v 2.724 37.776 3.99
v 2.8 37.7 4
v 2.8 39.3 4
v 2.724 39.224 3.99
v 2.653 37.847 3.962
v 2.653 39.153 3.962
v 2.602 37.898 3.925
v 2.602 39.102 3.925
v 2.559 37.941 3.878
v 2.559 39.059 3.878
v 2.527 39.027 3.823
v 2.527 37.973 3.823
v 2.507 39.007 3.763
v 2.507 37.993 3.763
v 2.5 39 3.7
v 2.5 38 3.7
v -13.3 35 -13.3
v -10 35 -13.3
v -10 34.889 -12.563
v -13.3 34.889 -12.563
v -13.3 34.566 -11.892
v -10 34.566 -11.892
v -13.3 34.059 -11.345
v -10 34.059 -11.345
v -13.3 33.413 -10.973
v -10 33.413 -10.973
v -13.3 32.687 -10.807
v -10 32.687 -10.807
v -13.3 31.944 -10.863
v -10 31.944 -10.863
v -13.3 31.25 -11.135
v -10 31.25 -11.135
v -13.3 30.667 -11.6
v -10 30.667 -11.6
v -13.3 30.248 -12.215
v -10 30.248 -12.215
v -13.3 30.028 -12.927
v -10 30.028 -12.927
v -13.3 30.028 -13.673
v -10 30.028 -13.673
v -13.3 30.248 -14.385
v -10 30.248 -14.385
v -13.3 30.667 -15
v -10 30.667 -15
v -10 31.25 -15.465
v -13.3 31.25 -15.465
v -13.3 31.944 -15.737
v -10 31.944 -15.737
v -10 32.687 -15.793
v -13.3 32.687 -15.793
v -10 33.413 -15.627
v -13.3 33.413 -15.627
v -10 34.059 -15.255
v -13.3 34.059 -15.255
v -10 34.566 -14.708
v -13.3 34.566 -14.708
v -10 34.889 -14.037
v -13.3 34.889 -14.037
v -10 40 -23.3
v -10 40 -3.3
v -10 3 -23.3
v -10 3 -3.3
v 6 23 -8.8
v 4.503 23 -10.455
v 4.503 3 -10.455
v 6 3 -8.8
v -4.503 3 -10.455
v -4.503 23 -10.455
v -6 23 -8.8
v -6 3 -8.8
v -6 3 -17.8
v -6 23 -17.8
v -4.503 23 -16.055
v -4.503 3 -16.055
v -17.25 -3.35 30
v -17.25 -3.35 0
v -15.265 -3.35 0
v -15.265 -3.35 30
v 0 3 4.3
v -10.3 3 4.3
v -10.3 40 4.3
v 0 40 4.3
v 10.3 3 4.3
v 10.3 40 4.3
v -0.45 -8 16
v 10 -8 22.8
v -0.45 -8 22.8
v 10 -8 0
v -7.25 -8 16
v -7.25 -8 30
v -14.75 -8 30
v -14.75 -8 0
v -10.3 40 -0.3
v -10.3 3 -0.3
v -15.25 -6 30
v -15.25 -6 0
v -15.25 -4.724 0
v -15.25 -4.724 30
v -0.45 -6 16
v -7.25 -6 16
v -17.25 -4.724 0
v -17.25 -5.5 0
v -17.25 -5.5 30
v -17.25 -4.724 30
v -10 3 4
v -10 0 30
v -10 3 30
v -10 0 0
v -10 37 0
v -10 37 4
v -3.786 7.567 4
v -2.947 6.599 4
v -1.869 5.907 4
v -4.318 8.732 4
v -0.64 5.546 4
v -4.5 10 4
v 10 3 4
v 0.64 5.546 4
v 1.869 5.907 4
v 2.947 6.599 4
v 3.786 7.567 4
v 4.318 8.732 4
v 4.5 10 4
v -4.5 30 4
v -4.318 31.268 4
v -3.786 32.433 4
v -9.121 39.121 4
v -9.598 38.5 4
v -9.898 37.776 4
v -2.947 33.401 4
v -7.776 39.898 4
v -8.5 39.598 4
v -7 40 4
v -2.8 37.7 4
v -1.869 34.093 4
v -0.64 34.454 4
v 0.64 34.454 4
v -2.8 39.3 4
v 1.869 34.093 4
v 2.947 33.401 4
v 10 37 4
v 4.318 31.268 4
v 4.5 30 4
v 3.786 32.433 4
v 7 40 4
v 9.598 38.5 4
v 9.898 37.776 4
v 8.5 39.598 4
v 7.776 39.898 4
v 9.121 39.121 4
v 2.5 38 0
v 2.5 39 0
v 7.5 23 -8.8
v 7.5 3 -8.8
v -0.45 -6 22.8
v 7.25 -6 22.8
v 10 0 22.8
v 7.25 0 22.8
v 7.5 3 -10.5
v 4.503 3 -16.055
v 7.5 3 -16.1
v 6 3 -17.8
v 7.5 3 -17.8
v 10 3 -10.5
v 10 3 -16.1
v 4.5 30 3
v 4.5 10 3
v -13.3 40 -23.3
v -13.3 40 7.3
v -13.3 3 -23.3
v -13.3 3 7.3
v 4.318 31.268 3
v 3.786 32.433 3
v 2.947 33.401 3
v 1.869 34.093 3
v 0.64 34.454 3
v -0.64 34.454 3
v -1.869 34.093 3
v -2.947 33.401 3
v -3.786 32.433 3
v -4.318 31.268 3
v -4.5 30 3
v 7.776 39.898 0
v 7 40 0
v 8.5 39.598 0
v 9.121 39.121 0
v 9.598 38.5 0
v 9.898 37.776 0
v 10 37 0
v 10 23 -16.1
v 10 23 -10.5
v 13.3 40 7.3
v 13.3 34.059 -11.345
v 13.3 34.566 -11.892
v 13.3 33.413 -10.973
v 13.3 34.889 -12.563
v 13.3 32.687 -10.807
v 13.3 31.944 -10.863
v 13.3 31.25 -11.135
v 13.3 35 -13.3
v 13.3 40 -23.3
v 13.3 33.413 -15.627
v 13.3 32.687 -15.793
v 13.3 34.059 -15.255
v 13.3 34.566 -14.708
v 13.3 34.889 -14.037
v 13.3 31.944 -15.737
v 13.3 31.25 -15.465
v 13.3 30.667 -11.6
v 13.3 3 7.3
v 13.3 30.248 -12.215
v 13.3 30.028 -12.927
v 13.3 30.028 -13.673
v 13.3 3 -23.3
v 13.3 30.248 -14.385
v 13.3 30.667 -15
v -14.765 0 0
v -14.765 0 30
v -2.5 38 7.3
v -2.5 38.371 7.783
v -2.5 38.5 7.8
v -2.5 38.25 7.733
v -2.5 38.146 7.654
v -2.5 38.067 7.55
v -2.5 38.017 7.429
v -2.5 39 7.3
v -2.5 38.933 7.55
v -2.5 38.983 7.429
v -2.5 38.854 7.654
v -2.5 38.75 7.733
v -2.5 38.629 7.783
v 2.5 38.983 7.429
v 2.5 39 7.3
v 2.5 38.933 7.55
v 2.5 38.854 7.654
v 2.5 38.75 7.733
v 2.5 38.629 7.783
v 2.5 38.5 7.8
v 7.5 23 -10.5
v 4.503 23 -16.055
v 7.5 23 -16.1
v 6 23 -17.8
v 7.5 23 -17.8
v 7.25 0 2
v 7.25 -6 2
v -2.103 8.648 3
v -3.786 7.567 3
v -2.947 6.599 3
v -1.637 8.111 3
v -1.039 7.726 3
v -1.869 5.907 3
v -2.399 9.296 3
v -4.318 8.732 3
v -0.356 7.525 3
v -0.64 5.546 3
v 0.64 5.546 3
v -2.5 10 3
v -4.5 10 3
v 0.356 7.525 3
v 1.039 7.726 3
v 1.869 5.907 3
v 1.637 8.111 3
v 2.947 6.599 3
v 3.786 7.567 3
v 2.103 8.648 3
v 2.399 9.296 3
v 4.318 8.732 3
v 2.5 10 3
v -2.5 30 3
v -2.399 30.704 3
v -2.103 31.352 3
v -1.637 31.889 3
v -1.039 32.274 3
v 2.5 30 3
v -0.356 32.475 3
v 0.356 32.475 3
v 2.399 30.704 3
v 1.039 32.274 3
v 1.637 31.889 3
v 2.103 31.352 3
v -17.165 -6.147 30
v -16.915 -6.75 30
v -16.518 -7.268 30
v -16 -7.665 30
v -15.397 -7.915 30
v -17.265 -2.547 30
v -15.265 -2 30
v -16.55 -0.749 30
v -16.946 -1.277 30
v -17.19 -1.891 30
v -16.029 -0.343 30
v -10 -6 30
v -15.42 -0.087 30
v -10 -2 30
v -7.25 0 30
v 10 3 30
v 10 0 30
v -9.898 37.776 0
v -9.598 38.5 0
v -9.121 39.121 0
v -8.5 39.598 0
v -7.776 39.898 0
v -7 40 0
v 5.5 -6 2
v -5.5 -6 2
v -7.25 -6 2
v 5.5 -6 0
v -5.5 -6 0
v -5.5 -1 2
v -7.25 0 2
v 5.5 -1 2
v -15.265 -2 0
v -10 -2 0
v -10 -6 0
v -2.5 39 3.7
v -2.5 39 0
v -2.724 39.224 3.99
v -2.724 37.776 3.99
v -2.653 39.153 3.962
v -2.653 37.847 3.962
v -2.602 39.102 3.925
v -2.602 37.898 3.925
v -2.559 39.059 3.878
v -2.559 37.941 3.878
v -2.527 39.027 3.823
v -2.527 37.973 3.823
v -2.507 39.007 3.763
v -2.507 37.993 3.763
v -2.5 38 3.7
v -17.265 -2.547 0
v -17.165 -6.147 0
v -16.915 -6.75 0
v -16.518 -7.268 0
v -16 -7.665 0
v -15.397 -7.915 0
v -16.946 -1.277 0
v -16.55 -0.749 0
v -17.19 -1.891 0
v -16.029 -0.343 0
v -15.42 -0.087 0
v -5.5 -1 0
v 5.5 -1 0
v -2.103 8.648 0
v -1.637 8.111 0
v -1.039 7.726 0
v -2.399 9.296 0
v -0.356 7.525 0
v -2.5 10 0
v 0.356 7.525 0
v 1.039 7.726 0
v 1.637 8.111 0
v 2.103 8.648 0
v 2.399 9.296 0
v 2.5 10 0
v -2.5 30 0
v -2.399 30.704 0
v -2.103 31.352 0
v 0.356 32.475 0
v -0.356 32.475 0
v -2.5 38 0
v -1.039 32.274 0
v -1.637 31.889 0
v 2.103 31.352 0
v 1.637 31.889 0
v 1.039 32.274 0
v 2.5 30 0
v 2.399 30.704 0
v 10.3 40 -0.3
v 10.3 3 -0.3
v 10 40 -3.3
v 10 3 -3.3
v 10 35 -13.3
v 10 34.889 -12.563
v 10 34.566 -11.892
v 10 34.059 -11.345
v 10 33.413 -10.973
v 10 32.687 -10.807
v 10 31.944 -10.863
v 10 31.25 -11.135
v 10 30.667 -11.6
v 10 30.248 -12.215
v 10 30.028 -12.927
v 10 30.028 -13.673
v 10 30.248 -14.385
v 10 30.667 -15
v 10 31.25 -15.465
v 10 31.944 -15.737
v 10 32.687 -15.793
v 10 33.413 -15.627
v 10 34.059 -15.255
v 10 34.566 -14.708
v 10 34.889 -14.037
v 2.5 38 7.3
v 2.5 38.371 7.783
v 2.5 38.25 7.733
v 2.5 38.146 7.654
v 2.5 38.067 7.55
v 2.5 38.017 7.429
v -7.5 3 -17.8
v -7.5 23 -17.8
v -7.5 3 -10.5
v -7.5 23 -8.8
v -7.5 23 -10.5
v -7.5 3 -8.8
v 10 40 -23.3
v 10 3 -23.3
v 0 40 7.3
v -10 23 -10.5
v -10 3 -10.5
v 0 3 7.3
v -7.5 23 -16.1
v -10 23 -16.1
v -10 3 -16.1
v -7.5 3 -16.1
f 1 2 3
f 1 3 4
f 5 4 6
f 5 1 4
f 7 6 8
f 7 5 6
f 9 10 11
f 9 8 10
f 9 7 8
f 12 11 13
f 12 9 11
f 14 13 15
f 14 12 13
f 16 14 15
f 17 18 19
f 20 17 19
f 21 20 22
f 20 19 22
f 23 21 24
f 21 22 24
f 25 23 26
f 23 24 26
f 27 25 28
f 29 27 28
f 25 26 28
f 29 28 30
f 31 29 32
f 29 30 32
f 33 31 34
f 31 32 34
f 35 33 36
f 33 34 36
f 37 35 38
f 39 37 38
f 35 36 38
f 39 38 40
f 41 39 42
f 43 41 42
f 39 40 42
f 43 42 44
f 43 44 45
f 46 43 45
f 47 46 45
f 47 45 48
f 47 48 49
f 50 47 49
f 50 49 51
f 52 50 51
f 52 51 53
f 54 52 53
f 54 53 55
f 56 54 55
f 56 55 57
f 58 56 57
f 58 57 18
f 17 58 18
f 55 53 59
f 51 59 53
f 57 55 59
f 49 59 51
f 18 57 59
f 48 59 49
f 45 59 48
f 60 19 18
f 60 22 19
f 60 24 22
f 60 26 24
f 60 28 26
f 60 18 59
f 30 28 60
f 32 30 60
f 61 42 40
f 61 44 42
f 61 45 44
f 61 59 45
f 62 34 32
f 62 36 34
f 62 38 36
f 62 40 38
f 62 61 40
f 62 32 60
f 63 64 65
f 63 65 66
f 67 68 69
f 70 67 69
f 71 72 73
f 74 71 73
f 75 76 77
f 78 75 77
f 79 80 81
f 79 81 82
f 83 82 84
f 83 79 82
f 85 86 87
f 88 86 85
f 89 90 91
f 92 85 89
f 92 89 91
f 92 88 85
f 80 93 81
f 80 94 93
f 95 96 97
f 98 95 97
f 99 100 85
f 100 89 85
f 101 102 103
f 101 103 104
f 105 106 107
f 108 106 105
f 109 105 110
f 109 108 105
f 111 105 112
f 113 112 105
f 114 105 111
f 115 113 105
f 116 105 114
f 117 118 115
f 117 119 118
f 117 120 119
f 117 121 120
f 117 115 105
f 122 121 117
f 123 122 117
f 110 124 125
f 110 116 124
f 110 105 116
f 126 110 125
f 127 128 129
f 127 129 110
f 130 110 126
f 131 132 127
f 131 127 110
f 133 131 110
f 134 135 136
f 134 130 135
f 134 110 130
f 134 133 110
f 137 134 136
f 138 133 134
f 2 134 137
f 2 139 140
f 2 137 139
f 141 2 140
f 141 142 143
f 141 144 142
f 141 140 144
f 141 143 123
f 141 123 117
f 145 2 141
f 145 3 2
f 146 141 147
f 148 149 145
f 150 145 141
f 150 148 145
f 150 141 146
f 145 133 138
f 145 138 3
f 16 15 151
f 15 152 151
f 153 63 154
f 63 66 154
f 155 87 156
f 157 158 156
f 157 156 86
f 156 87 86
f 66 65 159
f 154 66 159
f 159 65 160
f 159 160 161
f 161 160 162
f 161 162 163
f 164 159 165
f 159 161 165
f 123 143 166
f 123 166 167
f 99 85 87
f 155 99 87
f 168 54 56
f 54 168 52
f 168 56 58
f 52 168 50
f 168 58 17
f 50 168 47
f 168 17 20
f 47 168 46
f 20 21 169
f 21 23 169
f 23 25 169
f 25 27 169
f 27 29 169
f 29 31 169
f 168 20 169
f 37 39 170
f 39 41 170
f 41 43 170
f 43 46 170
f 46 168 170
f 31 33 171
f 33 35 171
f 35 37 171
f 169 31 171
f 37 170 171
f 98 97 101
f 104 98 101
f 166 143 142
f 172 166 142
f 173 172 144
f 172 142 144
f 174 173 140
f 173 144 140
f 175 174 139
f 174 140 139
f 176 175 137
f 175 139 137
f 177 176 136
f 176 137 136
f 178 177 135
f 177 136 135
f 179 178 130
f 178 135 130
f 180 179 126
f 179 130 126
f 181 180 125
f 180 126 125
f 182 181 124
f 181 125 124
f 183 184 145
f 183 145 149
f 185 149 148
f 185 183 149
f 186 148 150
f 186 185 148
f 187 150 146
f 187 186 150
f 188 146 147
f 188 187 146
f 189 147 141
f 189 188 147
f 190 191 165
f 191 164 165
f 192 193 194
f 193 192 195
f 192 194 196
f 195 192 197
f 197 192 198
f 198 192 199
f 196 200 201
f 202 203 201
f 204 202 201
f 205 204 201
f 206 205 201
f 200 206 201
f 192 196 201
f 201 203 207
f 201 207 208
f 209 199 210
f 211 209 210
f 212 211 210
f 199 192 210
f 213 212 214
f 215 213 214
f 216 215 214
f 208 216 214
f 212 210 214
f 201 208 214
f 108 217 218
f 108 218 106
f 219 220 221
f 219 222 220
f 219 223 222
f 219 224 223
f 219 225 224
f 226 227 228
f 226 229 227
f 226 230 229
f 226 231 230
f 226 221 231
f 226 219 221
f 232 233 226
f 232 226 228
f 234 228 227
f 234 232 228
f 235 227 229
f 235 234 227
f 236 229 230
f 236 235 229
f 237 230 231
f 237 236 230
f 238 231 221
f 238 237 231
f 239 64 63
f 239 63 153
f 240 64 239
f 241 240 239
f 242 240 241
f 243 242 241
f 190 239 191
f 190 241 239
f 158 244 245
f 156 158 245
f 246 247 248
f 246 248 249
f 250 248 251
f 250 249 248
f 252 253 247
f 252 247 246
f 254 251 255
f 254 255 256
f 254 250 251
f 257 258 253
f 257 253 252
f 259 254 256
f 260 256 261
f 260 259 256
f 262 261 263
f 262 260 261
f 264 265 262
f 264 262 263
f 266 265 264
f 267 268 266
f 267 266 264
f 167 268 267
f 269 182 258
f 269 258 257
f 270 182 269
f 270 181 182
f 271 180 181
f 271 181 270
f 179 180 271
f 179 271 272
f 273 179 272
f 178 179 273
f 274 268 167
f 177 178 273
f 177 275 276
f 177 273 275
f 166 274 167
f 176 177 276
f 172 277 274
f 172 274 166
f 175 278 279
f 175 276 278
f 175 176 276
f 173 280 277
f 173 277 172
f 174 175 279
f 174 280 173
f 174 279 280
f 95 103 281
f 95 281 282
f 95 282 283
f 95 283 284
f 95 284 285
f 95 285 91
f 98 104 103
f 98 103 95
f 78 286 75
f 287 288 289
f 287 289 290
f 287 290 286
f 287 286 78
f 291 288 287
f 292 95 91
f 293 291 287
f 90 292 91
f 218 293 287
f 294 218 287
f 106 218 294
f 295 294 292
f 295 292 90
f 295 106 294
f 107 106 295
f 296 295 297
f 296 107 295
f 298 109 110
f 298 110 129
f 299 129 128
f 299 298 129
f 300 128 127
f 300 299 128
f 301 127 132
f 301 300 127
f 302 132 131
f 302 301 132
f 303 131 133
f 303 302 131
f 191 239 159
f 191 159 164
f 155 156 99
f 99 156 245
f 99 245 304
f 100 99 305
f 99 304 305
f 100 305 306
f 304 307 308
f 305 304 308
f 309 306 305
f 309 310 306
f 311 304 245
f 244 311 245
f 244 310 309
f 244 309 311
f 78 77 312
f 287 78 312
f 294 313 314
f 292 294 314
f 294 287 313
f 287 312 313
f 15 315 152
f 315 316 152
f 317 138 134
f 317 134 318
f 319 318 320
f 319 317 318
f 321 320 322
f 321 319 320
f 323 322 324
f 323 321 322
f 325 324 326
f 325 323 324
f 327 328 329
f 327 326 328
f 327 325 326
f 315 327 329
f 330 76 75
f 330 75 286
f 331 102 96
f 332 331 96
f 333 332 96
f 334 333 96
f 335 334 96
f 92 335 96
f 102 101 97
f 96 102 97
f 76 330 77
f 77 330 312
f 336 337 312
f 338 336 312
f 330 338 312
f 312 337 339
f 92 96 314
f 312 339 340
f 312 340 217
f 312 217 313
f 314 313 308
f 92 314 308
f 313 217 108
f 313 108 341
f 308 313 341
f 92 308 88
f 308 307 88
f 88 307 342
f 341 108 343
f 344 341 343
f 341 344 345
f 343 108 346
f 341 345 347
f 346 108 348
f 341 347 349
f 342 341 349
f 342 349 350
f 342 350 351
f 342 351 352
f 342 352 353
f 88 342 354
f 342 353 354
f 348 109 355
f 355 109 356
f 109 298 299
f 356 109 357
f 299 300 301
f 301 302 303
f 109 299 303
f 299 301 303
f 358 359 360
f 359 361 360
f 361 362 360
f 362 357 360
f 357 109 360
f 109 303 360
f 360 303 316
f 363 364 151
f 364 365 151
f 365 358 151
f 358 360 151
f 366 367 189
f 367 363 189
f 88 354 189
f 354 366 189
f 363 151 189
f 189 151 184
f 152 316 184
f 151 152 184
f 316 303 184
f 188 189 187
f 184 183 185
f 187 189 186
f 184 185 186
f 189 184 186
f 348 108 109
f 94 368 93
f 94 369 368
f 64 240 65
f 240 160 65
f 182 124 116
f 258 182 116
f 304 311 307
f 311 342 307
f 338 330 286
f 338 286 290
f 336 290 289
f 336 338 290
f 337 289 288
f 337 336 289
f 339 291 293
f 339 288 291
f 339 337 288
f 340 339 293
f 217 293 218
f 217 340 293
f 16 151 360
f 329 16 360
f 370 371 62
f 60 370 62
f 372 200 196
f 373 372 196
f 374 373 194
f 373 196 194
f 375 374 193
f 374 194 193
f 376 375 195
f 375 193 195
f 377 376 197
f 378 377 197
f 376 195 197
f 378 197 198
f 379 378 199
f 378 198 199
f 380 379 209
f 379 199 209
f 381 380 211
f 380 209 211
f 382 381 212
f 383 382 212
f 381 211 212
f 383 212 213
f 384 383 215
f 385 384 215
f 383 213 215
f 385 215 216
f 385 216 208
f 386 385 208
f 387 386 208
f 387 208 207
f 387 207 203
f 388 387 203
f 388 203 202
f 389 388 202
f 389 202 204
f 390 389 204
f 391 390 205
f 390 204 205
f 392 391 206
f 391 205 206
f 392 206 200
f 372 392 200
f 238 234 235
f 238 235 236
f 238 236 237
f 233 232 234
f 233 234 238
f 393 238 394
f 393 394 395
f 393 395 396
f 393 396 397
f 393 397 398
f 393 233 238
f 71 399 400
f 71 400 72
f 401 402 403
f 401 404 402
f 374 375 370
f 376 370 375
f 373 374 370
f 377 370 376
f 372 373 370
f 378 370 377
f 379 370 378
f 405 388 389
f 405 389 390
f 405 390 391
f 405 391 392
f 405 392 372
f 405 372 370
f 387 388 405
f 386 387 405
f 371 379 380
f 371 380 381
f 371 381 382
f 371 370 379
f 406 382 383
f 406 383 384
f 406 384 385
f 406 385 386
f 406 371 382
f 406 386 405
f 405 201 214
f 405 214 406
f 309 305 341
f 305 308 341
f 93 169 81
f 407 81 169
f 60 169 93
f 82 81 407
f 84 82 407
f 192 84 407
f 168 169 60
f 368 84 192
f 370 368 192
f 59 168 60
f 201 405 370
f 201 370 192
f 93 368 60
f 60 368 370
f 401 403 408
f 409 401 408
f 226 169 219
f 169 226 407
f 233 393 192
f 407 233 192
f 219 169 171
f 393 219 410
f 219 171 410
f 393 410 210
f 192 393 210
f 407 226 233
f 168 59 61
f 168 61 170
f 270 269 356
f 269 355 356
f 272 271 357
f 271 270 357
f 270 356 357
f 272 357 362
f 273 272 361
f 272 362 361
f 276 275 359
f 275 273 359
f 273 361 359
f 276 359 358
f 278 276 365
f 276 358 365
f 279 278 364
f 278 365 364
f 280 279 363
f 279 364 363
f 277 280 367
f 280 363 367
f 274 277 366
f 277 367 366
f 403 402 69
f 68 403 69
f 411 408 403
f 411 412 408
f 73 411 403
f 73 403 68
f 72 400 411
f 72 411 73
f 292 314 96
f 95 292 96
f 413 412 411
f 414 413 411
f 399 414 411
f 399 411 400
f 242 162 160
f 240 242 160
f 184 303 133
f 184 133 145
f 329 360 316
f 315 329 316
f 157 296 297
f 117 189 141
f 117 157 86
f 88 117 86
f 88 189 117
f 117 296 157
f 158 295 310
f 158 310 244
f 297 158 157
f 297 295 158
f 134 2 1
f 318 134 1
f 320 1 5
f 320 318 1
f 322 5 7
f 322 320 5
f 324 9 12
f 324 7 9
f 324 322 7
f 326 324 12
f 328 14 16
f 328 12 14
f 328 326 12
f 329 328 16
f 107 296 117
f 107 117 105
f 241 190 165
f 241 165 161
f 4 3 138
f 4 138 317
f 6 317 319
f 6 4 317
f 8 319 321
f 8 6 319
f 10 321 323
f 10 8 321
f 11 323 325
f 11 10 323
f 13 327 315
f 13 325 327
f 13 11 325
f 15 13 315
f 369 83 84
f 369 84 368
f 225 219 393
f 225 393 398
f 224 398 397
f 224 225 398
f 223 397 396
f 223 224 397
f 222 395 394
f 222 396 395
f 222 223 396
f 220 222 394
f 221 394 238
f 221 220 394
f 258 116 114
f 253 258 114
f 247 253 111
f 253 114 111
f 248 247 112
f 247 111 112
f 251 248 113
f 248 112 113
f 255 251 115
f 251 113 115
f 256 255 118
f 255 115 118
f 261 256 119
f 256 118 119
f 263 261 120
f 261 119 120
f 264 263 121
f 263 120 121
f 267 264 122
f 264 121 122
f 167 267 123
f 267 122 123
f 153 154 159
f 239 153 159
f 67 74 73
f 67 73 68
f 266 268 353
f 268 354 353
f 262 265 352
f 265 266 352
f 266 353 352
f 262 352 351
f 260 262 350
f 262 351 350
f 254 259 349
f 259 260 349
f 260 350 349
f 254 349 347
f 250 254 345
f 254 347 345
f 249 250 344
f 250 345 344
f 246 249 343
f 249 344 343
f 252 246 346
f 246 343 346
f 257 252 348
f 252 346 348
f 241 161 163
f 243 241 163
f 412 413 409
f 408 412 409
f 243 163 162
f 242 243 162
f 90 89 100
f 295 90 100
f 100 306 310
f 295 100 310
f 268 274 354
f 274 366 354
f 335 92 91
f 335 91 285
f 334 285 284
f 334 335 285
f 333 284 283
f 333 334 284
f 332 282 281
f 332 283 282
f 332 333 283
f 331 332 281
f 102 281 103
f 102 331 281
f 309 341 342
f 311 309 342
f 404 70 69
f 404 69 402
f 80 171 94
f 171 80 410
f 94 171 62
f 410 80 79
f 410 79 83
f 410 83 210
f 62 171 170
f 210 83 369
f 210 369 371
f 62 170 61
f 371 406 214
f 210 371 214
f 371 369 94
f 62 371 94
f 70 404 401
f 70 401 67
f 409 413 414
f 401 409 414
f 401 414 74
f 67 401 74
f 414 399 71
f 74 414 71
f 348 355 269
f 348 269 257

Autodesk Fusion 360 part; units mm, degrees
sketch "Esquisse1" plane through (0, 0, 0) normal (0, 0, 1) x (1, 0, 0)
  line L0 (0, 80) -> (0, -6.3898) construction
  line L1 (-15, 30) -> (6, 30) construction
  line L2 (-7.25, 0) -> (7.25, 0)
  line L3 (7.25, 0) -> (7.25, -6)
  line L4 (-7.25, -6) -> (-7.25, 0)
  line L5 (-5.5, -1) -> (5.5, -1)
  line L6 (5.5, -1) -> (5.5, -6)
  line L7 (5.5, -6) -> (-5.5, -6)
  line L8 (-5.5, -6) -> (-5.5, -1)
  line L9 (5.5, -6) -> (7.25, -6)
  line L10 (7.25, -6) -> (-5.5, -6)
  line L11 (-7.25, -6) -> (-5.5, -6)
  line L12 (-10, 0) -> (-10, 37)
  line L13 (-7, 40) -> (7, 40)
  arc A0 (4.5, 30) -> (-4.5, 30) centre (0, 30) ccw
  arc A1 (2.5, 30) -> (-2.5, 30) centre (0, 30) ccw
  line L14 (-13, 20) -> (15, 20) construction
  line L15 (-13, 10) -> (15, 10) construction
  arc A2 (-4.5, 10) -> (4.5, 10) centre (0, 10) ccw
  arc A3 (-2.5, 10) -> (2.5, 10) centre (0, 10) ccw
  line L16 (-4.5, 30) -> (-4.5, 10)
  line L17 (-2.5, 30) -> (-2.5, 10)
  line L18 (2.5, 30) -> (2.5, 10)
  line L19 (4.5, 30) -> (4.5, 10)
  line L20 (-19.75, -1.5) -> (-19.75, -9) construction
  line L21 (-15.265, -2) -> (-12, -2)
  line L22 (-10, -8) -> (-14.75, -8)
  line L23 (-14.7654, 0) -> (-10, 0)
  line L24 (-17.25, -3.35) -> (-15.265, -3.35)
  line L25 (-15.25, -4.7238) -> (-17.25, -4.7238)
  line L26 (-15.265, -3.35) -> (-15.265, -2)
  line L27 (-17.25, -5.5) -> (-17.25, -4.7238)
  line L28 (-17.25, -3.35) -> (-17.265, -2.5467)
  arc A4 (-14.7654, 0) -> (-17.265, -2.5467) centre (-14.7654, -2.5) ccw
  arc A5 (-17.25, -5.5) -> (-14.75, -8) centre (-14.75, -5.5) ccw
  line L29 (-12, -2) -> (-10, -2)
  line L30 (-10, -2) -> (-10, -6)
  line L31 (-10, -6) -> (-15.25, -6)
  line L32 (-15.25, -6) -> (-15.25, -4.7238)
  line L33 (-13, -4.0369) -> (-21, -4.0369) construction
  line L34 (10, -8) -> (-10, -8)
  line L35 (10, 37) -> (10, -8)
  line L36 (10, 3) -> (-10, 3)
  arc A6 (-7, 40) -> (-10, 37) centre (-7, 37) ccw
  arc A7 (10, 37) -> (7, 40) centre (7, 37) ccw
  line L37 (-2.5, 39) -> (2.5, 39)
  line L38 (2.5, 39) -> (2.5, 38)
  line L39 (2.5, 38) -> (-2.5, 38)
  line L40 (-2.5, 38) -> (-2.5, 39)
  dimension "d49" = 11
  dimension "d50" = 5
  dimension "d51" = 1
  dimension "d52" = 14.5
  dimension "d67" = 30
  dimension "d68" = 5
  dimension "d86" = 10
  dimension "d87" = 2
  dimension "d100" = 2.5
  dimension "d101" = 2.5
  dimension "d108" = 2
  dimension "d109" = 2
  dimension "d111" = 1.3738
  dimension "d112" = 2
  dimension "d113" = 2
  dimension "d114" = 5.25
  dimension "d115" = 4
  dimension "d117" = 1.2762
  dimension "d132" = 2
  dimension "d133" = 5.265
  dimension "d135" = 48
  dimension "d136" = 20
  dimension "d137" = 2.75
  dimension "d140" = 3
  dimension "d153" = 3
  dimension "d154" = 1
  dimension "d155" = 1
  dimension "d156" = 5
extrude "Extrusion18" add sketch "Esquisse1" along normal blind 2 contours L2 L3 L4 L5 L6 L8 L9 L10 L11 makes body 1
extrude "Extrusion19" add sketch "Esquisse1" along normal blind 4 separate body contours L12 L13 L35 L36 A6 A7 | A0 A2 L16 L19 | L37 L38 L39 L40 makes body 2
extrude "Extrusion20" add sketch "Esquisse1" along normal blind 30 contours L12 L21 L22 L23 L24 L25 L26 L27 L28 A4 A5 L29 L30 L31 L32 L34 L35 L36 bodies 1 2
sketch "Esquisse11" plane through (0, -8, 0) normal (0, -1, 0) x (1, 0, 0)
  line L0 (-10, 0) -> (10, 0)
  line L1 (10, 0) -> (10, 30)
  line L2 (10, 30) -> (-10, 30)
  line L3 (-10, 30) -> (-10, 0)
  line L4 (7.25, 2) -> (7.25, 30)
  line L5 (-7.25, 2) -> (-7.25, 30)
  line L6 (-7.25, 30) -> (-7.25, 16)
  line L7 (-0.45, 16) -> (-0.45, 22.8)
  line L8 (-0.45, 22.8) -> (7.25, 22.8)
  line L9 (-7.25, 16) -> (-0.45, 16)
  dimension "d145" = 6.8
  dimension "d146" = 6.8
  dimension "d147" = 16
extrude "Extrusion21" cut sketch "Esquisse11" against normal up to surface (2 mm away) contours L2 L4 L5 L6 L7 L8 L9 bodies 1
extrude "Extrusion22" cut sketch "Esquisse1" against normal blind 1 from surface at 4 contours A0 A2 L16 L19 bodies 1
copy_body "Corps->Comp1" bodies 1 removing the originals makes body 3 in component "IR_Support"
extrude "Extrusion1" cut sketch "Esquisse1" against normal blind 2 from surface at 4 contours L37 L38 L39 L40 bodies 3 in component "IR_Support"
fillet "Congé1" radius 0.3 4 edges at (2.5, 38.5, 4) (0, 38, 4) (-2.5, 38.5, 4) (0, 39, 4) on bodies 3 in component "IR_Support"
ref_plane "Plan de construction1" through (0, 3, 0) normal (0, 1, 0) x (0, 0, 1) in component "Frame_Support"
sketch "Esquisse1 (2)" plane through (0, 3, 0) normal (0, 1, 0) x (1, 0, 0) in component "Frame_Support"
  line L0 (-10, -4) -> (10, -4)
  line L1 (10, -4) -> (10, 0)
  line L2 (10, 0) -> (-10, 0)
  line L3 (-10, 0) -> (-10, -4)
  line L4 (-10.3, -4.3) -> (10.3, -4.3)
  line L5 (10.3, -4.3) -> (10.3, 0.3)
  line L6 (10.3, 0.3) -> (-10.3, 0.3)
  line L7 (-10.3, 0.3) -> (-10.3, -4.3)
  line L8 (-13.3, -7.3) -> (13.3, -7.3)
  line L9 (13.3, -7.3) -> (13.3, 23.3)
  line L10 (-13.3, 23.3) -> (-13.3, -7.3)
  line L11 (0, -1.75) -> (0, -22.5)
  line L12 (10, 3.3) -> (-10, 3.3)
  line L13 (-10, 23.3) -> (-10, 3.3)
  line L14 (10, 3.3) -> (10, 23.3)
  line L15 (13.3, 23.3) -> (10, 23.3)
  line L16 (-10, 23.3) -> (-13.3, 23.3)
  line L17 (-15, 13.3) -> (16, 13.3) construction
  line L18 (-5.9999, 8.8) -> (-7.4999, 8.8)
  line L19 (-7.4999, 8.8) -> (-7.4999, 10.5)
  line L20 (-7.4999, 10.5) -> (-9.9999, 10.5)
  line L21 (-9.9999, 10.5) -> (-9.9999, 16.1)
  line L22 (-9.9999, 16.1) -> (-7.4999, 16.1)
  line L23 (-7.4999, 16.1) -> (-7.4999, 17.8)
  line L24 (-7.4999, 17.8) -> (-5.9999, 17.8)
  line L25 (-5.9999, 17.8) -> (-4.5028, 16.0546)
  line L26 (-4.5028, 16.0546) -> (-4.5028, 10.4546)
  line L27 (-4.5028, 10.4546) -> (-5.9999, 8.8)
  line L28 (5.9999, 8.8) -> (7.4999, 8.8)
  line L29 (7.4999, 8.8) -> (7.4999, 10.5)
  line L30 (7.4999, 10.5) -> (9.9999, 10.5)
  line L31 (9.9999, 10.5) -> (9.9999, 16.1)
  line L32 (9.9999, 16.1) -> (7.4999, 16.1)
  line L33 (7.4999, 16.1) -> (7.4999, 17.8)
  line L34 (7.4999, 17.8) -> (5.9999, 17.8)
  line L35 (5.9999, 17.8) -> (4.5028, 16.0546)
  line L36 (4.5028, 10.4546) -> (5.9999, 8.8)
  line L37 (4.5028, 16.0546) -> (4.5028, 10.4546)
  dimension "d163" = 20
  dimension "d164" = 4
  dimension "d165" = 0.3
  dimension "d166" = 3
  dimension "d167" = 3
  dimension "d168" = 3
  dimension "d169" = 20
  dimension "d170" = 20
  dimension "d171" = 3.3
  dimension "d17" = 2.5
  dimension "d18" = 2.5
  dimension "d19" = 1.5
  dimension "d20" = 1.5
  dimension "d21" = 5.6
  dimension "d22" = 9
  dimension "d23" = 5.6
  dimension "d26" = 1.7
extrude "Extrusion1'" add sketch "Esquisse1 (2)" along normal blind 37 separate body contours L8 L9 L10 L12 L13 L14 L15 L16 L21 L31 makes body 4 in component "Frame_Support"
extrude "Extrusion2" add sketch "Esquisse1 (2)" along normal blind 20 separate body contours L13 L18 L19 L20 L21 L22 L23 L24 L25 L26 L27 | L14 L28 L29 L30 L31 L32 L33 L34 L35 L36 L37 makes body 5 at (-4.5028, 9.6667, -14.188) makes body 6 at (4.5028, 9.6667, -14.188) in component "Frame_Support"
sketch "Esquisse2" plane through (13.3, 0, 0) normal (1, 0, 0) x (0, 1, 0) in component "Frame_Support"
  line L0 (3, 7.3) -> (3, -23.3)
  line L1 (3, -23.3) -> (40, -23.3)
  line L2 (40, -23.3) -> (40, 7.3)
  line L3 (40, 7.3) -> (3, 7.3)
  line L4 (45, -13.3) -> (20, -13.3) construction
  line L5 (32.5, -5) -> (32.5, -27.6162) construction
  circle A0 centre (32.5, -13.3) radius 2.5
  dimension "d184" = 10
  dimension "d185" = 7.5
  dimension "d186" = 5
extrude "Extrusion3" cut sketch "Esquisse2" against normal up to surface (26.6 mm away) contours A0 bodies 4 in component "Frame_Support"
sketch "Esquisse3" plane through (0, 0, 7.3) normal (0, 0, 1) x (-1, 0, 0) in component "Frame_Support"
  line L0 (13.3, -3) -> (-13.3, -3)
  line L1 (-13.3, -3) -> (-13.3, -40)
  line L2 (-13.3, -40) -> (13.3, -40)
  line L3 (13.3, -40) -> (13.3, -3)
  line L4 (20, -38.5) -> (-20, -38.5) construction
  line L5 (2.5, -39) -> (-2.5, -39)
  line L6 (-2.5, -39) -> (-2.5, -38)
  line L7 (-2.5, -38) -> (2.5, -38)
  line L8 (2.5, -38) -> (2.5, -39)
  line L9 (0, -42) -> (0, -32) construction
  line L10 (-13.3, -40) -> (-13.3, -3)
  dimension "d190" = 5
  dimension "d191" = 1
  dimension "d192" = 1
extrude "Extrusion4" add sketch "Esquisse3" along normal blind 0.5 contours L5 L6 L7 L8 bodies 4 in component "Frame_Support"
fillet "Congé1'" radius 0.5 2 edges at (0, 38, 7.8) (0, 39, 7.8) on bodies 4 in component "Frame_Support"
sketch "Esquisse3 (2)" plane through (0, 0, 30) normal (0, 0, 1) x (-1, 0, 0) in component "IR_Support"
  line L0 (-7.25, 6) -> (-7.25, 8)
  line L1 (-7.25, 8) -> (-10, 8)
  line L2 (-10, 8) -> (-10, -3)
  line L3 (-10, -3) -> (10, -3)
  line L4 (10, -3) -> (10, 0)
  line L5 (10, 0) -> (14.7654, 0)
  arc A0 (14.7654, 0) -> (17.265, 2.5467) centre (14.7654, 2.5) ccw
  line L6 (17.265, 2.5467) -> (17.25, 3.35)
  line L7 (17.25, 3.35) -> (15.265, 3.35)
  line L8 (15.265, 3.35) -> (15.265, 2)
  line L9 (15.265, 2) -> (10, 2)
  line L10 (10, 2) -> (10, 6)
  line L11 (10, 6) -> (15.25, 6)
  line L12 (15.25, 6) -> (15.25, 4.7238)
  line L13 (15.25, 4.7238) -> (17.25, 4.7238)
  line L14 (17.25, 4.7238) -> (17.25, 5.5)
  arc A1 (17.25, 5.5) -> (14.75, 8) centre (14.75, 5.5) ccw
  line L15 (14.75, 8) -> (10, 8)
  line L16 (10, 8) -> (7.25, 8)
  line L17 (7.25, 8) -> (7.25, 6)
  line L18 (7.25, 6) -> (7.25, 0)
  line L19 (7.25, 0) -> (-7.25, 0)
  line L20 (-7.25, 0) -> (-7.25, 6)
  line L21 (-7.25, 0) -> (-10, 0)
  line L22 (-10, 0) -> (-10, 8)
  line L23 (-10, 8) -> (-7.25, 8)
  line L24 (-7.25, 8) -> (-7.25, 0)
  point P0 (-7.25, 8)
extrude "Extrusion2'" cut sketch "Esquisse3 (2)" against normal blind 7.2 contours L0 L1 L2 L20 L21 L22 L23 L24 bodies 3 in component "IR_Support"
component "IR_Support" placed x (1, 0, 0) y (0, 1, 0) z (0, 0, 1) at (0, 0, 0)
component "Frame_Support" placed x (1, 0, 0) y (0, 1, 0) z (0, 0, 1) at (0, 0, 0)
